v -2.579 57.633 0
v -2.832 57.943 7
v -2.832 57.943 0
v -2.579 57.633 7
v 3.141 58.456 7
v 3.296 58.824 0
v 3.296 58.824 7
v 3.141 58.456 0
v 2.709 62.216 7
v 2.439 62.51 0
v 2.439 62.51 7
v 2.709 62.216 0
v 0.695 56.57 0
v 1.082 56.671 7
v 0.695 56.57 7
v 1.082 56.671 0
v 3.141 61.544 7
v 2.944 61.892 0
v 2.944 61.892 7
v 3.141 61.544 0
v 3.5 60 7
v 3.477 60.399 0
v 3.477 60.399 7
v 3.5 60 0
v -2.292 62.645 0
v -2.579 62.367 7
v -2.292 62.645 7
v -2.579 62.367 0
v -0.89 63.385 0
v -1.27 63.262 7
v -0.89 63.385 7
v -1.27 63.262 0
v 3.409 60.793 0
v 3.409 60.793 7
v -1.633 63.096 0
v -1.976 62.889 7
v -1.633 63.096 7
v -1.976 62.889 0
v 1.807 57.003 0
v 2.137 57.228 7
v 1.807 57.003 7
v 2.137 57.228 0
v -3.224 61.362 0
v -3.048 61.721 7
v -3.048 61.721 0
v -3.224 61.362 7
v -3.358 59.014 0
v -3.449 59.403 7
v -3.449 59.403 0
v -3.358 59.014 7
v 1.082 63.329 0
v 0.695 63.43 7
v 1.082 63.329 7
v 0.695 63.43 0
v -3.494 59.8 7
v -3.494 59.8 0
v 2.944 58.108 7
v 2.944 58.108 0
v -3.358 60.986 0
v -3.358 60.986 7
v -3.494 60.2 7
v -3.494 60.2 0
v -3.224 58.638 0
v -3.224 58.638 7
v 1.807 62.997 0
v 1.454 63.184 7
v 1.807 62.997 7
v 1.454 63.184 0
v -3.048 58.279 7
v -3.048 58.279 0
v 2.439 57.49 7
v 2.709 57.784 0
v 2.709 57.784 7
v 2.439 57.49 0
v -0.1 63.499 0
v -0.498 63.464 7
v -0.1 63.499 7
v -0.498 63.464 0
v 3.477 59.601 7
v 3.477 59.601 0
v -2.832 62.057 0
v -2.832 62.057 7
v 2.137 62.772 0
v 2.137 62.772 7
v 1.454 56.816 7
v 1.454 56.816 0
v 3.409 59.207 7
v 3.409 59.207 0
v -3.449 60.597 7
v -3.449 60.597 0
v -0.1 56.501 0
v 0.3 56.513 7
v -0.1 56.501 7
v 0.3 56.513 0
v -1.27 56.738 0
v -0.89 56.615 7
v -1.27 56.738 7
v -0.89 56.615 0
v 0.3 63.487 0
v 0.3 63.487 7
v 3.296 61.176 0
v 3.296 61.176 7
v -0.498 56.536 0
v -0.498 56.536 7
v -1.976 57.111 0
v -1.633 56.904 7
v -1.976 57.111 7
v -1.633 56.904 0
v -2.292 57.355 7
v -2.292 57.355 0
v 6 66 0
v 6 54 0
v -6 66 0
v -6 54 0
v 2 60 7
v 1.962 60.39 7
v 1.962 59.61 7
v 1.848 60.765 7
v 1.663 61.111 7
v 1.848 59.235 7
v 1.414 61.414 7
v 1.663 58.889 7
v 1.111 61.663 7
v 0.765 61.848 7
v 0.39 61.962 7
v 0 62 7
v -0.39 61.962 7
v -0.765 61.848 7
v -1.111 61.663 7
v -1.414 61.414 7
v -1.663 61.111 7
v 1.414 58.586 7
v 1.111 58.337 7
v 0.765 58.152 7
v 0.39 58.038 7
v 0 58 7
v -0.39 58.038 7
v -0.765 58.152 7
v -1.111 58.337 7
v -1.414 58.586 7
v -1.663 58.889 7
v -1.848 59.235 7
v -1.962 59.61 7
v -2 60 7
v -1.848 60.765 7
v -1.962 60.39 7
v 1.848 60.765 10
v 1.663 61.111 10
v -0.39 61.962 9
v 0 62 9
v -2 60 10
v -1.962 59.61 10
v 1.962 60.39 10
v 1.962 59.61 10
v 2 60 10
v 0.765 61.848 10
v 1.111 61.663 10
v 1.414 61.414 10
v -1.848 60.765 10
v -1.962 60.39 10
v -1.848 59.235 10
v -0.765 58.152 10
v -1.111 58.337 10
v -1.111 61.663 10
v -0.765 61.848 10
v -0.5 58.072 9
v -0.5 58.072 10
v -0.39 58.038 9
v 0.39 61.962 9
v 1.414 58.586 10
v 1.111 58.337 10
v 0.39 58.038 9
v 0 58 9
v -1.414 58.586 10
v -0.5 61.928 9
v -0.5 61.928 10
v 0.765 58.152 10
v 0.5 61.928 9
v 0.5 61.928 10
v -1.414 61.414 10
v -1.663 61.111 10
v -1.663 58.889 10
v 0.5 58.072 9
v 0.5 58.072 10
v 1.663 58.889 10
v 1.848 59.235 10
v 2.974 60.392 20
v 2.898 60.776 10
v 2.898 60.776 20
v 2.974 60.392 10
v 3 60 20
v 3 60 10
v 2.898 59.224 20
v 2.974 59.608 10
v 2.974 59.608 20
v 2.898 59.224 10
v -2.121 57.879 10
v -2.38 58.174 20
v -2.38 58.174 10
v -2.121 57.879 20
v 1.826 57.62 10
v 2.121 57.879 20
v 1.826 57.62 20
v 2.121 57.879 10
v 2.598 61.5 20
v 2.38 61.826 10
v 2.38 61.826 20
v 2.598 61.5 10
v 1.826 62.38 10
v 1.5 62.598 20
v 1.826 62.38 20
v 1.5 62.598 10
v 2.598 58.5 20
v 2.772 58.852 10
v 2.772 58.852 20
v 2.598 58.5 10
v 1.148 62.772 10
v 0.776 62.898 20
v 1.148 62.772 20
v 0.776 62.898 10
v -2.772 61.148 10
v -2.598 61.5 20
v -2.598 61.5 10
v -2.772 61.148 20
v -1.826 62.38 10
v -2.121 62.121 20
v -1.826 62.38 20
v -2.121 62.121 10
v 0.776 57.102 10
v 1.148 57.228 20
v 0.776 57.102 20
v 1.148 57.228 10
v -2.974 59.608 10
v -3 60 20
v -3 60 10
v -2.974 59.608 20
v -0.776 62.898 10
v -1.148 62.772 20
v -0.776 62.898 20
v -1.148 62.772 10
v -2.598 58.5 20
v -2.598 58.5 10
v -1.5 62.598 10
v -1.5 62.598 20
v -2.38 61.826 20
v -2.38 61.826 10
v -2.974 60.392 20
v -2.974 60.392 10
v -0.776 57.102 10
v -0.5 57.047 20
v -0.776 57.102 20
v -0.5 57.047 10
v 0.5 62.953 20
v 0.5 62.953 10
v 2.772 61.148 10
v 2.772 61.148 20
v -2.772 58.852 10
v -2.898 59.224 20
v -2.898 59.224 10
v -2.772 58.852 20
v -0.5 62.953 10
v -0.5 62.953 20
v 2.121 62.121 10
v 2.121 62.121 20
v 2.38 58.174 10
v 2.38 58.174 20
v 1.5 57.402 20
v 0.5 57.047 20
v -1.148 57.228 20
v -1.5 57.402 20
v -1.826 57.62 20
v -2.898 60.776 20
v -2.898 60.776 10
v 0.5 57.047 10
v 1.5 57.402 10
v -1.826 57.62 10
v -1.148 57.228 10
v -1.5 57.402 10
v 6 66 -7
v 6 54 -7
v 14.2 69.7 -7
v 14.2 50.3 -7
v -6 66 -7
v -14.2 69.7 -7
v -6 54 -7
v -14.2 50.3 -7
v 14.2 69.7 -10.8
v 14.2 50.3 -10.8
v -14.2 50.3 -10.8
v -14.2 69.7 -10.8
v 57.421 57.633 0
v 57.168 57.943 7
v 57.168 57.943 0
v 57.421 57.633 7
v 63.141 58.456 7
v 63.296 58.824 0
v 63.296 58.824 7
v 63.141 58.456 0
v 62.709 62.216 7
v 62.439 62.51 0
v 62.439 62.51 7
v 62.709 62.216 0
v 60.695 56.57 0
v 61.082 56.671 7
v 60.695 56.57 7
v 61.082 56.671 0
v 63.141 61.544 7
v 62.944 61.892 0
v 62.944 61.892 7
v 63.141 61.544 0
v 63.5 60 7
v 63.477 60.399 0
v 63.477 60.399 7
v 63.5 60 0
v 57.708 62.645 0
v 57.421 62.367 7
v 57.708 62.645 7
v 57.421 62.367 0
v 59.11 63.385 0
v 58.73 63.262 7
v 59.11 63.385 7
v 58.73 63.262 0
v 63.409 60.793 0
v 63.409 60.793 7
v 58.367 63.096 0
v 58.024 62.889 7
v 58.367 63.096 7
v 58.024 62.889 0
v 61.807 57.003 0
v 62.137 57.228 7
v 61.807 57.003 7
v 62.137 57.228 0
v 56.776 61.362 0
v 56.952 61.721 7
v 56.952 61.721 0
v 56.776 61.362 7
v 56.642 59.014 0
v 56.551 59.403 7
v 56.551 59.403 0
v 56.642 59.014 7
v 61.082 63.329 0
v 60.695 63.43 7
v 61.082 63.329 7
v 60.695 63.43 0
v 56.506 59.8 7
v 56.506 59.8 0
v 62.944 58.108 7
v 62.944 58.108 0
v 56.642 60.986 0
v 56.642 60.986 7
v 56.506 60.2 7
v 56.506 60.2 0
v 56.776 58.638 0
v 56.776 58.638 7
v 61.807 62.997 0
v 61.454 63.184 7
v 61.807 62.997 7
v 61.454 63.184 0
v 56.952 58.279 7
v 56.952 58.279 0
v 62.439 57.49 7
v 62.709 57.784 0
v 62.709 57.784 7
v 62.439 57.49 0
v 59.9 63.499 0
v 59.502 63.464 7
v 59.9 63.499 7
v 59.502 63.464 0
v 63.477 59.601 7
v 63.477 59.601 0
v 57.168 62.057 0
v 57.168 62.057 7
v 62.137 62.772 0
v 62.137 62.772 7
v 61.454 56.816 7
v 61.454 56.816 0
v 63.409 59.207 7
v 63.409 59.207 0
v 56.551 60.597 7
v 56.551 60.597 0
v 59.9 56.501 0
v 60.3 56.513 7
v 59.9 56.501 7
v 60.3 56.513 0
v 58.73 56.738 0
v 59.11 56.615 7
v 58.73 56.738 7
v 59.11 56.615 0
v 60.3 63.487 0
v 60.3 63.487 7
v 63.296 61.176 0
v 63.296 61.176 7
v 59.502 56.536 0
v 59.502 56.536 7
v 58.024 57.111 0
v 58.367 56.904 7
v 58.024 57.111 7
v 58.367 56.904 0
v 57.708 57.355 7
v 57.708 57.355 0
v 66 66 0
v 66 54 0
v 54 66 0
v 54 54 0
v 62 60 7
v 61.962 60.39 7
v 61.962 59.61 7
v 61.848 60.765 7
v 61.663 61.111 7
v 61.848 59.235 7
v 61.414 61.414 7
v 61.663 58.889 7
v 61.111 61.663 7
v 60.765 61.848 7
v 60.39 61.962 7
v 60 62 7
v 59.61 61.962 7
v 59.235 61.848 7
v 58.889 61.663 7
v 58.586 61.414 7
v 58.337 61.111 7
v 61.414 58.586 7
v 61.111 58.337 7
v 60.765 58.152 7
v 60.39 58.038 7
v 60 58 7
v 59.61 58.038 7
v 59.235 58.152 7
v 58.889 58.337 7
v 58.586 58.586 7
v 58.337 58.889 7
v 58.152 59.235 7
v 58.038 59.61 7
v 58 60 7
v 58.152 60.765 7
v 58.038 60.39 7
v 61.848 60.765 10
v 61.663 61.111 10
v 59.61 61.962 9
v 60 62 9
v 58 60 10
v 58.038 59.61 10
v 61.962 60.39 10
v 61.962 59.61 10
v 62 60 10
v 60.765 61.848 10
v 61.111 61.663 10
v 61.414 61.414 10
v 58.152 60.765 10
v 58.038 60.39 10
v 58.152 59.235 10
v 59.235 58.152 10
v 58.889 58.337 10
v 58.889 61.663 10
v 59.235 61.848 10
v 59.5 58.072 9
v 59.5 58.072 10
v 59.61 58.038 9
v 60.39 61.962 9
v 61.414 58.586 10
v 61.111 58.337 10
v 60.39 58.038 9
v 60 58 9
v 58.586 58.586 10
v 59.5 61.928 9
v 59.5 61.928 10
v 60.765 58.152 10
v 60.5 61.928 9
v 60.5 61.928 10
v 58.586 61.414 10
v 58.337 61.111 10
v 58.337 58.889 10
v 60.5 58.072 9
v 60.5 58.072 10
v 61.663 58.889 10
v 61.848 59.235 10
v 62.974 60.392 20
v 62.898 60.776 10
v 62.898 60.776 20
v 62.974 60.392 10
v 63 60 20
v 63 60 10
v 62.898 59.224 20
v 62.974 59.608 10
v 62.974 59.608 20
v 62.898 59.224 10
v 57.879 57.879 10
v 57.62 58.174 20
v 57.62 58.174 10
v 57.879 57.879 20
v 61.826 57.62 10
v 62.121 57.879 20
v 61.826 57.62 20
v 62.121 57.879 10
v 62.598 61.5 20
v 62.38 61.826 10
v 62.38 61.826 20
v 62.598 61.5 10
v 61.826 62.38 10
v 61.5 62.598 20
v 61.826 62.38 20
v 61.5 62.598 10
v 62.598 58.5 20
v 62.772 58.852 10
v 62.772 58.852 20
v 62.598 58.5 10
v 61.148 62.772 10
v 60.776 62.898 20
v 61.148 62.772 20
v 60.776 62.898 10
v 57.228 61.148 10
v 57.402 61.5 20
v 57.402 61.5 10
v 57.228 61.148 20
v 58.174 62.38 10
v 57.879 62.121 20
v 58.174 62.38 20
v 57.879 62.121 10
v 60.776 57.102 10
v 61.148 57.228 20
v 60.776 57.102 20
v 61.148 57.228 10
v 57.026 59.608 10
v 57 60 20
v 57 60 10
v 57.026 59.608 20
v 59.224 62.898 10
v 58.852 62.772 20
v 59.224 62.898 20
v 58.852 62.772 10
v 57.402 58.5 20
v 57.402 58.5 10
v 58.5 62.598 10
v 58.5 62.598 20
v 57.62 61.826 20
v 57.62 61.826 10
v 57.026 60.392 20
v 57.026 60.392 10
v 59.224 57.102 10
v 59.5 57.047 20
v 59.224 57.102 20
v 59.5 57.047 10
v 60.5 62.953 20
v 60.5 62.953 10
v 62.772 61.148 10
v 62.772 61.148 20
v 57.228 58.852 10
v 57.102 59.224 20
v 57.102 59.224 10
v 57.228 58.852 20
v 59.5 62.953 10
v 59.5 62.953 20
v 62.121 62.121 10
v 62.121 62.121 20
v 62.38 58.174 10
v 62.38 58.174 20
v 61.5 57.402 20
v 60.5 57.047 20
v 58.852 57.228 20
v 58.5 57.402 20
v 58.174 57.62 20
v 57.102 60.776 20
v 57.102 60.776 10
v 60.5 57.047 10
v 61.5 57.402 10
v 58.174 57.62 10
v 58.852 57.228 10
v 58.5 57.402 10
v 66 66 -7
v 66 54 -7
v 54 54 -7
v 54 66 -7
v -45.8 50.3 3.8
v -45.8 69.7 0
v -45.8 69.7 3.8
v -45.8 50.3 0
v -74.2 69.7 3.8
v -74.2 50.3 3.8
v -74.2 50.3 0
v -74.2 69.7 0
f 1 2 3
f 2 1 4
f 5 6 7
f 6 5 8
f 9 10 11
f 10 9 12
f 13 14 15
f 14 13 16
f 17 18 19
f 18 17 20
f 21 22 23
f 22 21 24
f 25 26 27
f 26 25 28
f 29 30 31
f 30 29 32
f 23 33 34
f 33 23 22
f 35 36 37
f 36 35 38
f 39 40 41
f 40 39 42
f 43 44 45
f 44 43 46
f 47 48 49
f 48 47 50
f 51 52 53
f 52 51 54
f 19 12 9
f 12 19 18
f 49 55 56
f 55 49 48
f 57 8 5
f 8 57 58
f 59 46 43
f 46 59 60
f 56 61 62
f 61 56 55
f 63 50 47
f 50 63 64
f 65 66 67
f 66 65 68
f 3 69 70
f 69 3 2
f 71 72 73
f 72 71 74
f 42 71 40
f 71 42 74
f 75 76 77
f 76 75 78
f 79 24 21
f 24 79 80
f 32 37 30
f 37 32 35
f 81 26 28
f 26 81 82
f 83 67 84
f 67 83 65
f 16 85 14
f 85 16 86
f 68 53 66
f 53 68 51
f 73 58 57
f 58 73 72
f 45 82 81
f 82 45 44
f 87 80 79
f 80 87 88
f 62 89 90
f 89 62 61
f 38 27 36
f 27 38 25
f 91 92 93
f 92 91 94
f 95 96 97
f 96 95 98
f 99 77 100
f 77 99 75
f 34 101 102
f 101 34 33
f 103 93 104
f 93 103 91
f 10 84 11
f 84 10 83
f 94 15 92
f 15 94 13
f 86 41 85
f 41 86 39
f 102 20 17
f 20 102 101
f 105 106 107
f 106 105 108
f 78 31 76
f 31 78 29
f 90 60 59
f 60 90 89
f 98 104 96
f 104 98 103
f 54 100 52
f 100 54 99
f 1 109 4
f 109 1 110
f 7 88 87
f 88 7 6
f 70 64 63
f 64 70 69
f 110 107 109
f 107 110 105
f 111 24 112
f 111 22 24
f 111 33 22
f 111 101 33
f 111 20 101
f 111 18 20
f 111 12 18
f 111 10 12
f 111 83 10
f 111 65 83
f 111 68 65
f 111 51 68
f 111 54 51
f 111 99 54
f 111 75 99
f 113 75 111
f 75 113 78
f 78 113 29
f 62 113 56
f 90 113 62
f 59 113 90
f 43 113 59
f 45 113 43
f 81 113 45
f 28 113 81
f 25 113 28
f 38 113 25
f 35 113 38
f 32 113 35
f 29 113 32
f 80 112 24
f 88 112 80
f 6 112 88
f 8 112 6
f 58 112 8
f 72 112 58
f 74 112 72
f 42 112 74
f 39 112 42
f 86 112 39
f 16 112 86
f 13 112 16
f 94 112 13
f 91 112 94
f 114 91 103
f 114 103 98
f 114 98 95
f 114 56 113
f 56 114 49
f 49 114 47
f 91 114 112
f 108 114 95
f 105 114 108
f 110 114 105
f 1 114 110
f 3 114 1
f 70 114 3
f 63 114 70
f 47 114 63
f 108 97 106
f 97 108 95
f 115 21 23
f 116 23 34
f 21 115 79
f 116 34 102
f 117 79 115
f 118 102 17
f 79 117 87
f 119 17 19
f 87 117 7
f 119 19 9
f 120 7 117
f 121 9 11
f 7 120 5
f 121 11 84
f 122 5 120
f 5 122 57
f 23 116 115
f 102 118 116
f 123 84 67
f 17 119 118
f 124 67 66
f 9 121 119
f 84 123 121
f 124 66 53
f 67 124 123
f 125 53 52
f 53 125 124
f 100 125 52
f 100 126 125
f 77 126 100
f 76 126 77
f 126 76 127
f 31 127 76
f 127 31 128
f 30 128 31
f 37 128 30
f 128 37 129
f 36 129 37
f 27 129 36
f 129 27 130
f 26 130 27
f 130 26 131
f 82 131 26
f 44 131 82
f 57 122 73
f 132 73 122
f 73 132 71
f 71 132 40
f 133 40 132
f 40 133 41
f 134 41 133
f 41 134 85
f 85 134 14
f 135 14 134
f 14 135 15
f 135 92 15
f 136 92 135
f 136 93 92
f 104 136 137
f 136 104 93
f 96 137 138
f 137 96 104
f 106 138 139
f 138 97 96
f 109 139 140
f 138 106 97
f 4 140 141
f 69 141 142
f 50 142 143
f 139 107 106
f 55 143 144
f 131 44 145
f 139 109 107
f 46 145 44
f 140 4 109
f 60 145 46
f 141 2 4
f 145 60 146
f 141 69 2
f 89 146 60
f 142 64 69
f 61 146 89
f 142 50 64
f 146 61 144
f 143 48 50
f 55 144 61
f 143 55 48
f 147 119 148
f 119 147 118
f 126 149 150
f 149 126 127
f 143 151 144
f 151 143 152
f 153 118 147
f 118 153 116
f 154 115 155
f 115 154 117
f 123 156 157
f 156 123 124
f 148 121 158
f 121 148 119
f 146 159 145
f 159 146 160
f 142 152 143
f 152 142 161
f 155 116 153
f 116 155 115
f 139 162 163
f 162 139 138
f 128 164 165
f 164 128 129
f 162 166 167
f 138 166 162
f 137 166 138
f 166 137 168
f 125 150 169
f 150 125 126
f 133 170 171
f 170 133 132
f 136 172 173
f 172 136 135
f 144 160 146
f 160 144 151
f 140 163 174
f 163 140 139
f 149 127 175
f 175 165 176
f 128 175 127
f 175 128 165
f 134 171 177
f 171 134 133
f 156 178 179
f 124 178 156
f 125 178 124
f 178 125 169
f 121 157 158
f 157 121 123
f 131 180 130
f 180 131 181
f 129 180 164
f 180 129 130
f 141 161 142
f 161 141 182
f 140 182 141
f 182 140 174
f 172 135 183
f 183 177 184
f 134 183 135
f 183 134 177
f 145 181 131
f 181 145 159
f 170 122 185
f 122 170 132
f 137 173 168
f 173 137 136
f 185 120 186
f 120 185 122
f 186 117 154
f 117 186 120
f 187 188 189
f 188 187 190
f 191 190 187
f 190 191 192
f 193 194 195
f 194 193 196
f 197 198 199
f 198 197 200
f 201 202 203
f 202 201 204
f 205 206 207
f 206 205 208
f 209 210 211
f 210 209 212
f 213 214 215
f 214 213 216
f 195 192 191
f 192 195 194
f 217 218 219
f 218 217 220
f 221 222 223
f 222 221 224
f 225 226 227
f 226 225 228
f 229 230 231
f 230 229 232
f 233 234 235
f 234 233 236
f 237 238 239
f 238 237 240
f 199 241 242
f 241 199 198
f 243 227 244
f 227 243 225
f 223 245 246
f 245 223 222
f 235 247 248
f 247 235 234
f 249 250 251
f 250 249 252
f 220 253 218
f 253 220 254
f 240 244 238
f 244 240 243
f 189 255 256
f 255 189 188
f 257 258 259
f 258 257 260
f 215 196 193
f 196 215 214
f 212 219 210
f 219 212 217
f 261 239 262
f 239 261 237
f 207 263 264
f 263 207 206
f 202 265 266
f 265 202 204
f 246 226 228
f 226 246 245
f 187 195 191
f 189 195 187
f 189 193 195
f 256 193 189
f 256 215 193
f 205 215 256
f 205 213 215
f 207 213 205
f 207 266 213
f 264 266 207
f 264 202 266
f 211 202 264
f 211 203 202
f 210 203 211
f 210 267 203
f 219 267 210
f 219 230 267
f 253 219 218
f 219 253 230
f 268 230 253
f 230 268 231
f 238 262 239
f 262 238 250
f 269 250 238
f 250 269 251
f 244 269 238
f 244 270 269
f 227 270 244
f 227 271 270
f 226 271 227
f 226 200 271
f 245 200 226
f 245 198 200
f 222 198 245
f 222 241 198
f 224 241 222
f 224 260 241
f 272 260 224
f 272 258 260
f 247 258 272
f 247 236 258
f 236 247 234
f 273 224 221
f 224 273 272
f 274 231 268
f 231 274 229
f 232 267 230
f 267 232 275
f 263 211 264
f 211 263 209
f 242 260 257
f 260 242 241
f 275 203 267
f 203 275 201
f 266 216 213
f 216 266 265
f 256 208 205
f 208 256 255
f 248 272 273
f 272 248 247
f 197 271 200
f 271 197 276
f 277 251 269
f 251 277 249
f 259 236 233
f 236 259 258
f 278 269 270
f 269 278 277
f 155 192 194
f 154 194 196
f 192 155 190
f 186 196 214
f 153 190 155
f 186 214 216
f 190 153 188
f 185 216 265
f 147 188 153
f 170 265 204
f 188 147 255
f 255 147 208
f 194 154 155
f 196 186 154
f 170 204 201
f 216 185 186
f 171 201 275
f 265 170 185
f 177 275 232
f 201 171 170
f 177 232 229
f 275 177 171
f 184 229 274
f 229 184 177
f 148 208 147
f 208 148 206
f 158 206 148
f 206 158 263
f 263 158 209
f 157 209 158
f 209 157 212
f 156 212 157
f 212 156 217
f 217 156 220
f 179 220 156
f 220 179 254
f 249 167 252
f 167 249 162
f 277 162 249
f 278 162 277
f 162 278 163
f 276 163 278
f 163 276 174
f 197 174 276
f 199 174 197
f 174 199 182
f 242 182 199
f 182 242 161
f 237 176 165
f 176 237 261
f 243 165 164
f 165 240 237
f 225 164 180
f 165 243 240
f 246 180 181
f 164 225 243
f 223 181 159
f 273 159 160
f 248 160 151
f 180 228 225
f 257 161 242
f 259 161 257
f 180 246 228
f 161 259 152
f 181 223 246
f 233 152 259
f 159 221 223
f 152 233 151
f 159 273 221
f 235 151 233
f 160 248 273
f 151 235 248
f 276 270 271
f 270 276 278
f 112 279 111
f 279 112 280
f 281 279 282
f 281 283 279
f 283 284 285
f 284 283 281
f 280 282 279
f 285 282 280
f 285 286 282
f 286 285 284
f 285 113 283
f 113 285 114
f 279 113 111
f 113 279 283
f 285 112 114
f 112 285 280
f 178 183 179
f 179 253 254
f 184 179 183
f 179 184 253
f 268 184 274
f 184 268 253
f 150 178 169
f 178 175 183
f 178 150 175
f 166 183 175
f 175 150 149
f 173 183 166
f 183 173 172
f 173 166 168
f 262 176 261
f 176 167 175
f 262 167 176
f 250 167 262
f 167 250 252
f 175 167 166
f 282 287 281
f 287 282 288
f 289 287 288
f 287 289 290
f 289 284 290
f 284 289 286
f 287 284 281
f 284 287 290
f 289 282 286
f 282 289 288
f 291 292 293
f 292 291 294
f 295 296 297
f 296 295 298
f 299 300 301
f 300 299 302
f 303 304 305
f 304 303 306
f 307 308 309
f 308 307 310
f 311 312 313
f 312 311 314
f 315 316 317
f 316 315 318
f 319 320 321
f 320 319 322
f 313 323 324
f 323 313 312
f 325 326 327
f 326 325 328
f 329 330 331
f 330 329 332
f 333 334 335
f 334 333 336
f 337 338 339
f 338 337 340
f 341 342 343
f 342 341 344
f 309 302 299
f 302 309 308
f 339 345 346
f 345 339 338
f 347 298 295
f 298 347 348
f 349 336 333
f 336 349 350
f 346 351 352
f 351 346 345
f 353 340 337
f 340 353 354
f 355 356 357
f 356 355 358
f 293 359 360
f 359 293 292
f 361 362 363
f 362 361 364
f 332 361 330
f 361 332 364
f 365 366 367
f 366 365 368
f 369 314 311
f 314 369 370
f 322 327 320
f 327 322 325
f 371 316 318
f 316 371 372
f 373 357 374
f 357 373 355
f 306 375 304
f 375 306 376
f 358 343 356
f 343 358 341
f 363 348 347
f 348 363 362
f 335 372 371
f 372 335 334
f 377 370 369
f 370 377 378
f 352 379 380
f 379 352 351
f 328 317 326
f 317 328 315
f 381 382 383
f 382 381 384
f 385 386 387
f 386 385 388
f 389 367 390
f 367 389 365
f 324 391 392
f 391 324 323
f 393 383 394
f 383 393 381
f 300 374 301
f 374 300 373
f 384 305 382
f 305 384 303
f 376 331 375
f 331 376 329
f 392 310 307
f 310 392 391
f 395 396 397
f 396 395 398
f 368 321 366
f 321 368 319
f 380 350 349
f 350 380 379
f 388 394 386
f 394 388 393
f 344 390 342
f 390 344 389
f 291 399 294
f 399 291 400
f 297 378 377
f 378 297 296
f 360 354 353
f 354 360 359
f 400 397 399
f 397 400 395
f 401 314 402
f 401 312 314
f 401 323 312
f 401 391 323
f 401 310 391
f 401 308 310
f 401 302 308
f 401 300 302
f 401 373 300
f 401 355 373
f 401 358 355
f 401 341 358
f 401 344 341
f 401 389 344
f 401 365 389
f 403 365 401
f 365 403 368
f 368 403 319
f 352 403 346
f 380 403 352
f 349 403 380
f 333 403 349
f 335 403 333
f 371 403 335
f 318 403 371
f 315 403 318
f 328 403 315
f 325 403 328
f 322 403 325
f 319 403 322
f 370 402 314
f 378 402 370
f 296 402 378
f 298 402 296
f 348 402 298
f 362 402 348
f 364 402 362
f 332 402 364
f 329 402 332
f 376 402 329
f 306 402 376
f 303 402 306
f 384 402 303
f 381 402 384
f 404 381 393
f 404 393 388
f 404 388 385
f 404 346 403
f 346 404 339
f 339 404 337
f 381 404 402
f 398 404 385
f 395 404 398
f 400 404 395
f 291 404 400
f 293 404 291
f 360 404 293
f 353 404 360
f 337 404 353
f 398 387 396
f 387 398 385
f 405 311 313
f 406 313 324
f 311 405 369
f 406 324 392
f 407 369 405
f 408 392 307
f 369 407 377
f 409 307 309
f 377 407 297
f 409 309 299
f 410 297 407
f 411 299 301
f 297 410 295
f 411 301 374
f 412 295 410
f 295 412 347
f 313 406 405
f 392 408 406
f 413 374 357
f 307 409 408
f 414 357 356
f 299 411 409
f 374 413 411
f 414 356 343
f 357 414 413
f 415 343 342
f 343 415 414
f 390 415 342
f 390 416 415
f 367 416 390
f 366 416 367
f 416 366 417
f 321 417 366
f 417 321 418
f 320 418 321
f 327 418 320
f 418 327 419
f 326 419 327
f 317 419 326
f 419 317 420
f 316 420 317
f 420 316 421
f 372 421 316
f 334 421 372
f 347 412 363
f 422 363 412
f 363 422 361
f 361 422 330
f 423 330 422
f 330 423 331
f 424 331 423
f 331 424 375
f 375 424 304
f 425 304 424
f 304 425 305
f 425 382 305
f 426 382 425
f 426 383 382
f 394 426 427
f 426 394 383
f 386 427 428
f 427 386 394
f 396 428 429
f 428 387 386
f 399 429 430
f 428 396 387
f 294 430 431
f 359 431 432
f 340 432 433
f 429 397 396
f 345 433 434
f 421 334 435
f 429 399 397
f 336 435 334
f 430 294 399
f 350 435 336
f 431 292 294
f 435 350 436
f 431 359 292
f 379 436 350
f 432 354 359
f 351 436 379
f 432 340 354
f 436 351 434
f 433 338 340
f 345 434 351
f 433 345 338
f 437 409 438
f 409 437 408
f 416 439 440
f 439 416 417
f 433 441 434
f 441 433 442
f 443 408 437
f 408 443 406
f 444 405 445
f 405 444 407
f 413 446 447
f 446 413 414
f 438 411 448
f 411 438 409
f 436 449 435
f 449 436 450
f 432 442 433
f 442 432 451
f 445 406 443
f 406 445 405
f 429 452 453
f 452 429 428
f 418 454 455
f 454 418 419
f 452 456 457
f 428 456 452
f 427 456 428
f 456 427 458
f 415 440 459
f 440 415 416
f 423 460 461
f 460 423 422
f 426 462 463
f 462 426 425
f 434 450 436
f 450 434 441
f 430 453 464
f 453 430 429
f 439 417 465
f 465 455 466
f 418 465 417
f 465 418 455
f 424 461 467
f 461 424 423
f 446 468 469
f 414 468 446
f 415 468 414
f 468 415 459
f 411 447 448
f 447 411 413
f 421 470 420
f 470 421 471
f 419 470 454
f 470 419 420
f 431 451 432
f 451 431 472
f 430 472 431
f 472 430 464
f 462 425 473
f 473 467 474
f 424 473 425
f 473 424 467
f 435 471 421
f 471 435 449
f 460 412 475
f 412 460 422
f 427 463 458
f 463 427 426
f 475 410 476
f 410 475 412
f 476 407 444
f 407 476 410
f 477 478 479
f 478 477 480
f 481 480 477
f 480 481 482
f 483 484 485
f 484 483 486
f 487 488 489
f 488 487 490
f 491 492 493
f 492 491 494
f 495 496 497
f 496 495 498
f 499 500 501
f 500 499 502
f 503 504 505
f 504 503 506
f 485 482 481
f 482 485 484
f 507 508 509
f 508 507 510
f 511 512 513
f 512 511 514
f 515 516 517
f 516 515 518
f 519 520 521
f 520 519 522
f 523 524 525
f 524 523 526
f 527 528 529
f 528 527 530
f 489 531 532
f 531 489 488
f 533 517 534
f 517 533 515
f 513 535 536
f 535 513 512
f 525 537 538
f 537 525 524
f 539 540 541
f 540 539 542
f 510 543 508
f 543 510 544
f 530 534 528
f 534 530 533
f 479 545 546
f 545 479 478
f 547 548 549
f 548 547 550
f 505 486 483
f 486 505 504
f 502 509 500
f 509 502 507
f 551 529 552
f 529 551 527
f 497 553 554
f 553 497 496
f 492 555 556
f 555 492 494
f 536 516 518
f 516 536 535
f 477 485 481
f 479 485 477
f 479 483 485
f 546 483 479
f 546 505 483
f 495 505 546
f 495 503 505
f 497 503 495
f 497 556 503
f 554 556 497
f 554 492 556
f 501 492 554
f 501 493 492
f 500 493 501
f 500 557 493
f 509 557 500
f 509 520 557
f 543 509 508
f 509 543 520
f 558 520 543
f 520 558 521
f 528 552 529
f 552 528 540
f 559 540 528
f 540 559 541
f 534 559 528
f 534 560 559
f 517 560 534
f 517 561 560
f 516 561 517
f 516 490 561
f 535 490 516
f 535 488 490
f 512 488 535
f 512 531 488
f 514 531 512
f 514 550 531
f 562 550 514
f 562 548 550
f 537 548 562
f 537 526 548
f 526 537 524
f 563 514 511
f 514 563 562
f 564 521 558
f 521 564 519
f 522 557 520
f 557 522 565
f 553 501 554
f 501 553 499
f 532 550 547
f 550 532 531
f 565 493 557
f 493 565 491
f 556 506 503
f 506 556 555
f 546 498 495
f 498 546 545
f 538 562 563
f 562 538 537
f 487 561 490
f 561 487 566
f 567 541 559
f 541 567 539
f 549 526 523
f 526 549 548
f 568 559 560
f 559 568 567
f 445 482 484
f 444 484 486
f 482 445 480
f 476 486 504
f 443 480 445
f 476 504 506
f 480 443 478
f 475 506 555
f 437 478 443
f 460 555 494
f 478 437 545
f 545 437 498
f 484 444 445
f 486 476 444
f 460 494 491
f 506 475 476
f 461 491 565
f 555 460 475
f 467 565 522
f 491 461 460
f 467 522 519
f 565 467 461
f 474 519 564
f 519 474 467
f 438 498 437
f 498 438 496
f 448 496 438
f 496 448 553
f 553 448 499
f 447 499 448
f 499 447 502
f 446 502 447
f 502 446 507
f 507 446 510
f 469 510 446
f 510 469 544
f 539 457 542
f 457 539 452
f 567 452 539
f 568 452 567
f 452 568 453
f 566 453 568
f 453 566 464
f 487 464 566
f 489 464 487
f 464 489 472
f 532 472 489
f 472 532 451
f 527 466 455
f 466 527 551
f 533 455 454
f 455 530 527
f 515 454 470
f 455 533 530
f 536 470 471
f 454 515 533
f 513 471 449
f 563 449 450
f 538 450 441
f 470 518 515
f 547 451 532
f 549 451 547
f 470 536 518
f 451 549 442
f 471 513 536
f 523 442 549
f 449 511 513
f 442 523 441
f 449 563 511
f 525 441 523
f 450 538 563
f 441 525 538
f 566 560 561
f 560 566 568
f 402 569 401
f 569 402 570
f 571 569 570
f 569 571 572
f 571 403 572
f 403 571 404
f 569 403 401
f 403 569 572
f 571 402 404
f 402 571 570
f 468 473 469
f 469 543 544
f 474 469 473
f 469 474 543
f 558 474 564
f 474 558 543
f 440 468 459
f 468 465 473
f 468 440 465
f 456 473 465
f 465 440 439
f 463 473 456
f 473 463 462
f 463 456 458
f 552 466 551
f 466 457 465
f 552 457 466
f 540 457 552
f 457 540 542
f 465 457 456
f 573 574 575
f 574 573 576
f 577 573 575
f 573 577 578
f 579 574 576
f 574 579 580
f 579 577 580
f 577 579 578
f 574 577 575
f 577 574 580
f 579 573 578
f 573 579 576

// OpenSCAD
// Standard encoder dimensions
$fa = 6;
$fs = 0.4;

translate([0,60,0]) encoder_and_board();

translate([60,60,0]) encoder();

translate([-60,60,0]) encoder_board();

module encoder_and_board(){
    union(){
        encoder();
        translate([0,0,-7-3.8]) encoder_board(); 
    } 
}

module encoder_board(){
    translate([-14.2,-9.7,0]) cube([28.4,19.4,3.8]);    
}

module encoder(){
    difference(){
        union(){
            cylinder(d=7, h=7);
            cylinder(d=4, h=16);
            translate([0,0,10]) cylinder(d=6, h=10);
            translate([-6,-6,-7]) cube([12,12,7]);
        }
        // Keyway slot
        translate([0,0,20-5.5]) cube([1,12,11], center=true);  
    }
}
